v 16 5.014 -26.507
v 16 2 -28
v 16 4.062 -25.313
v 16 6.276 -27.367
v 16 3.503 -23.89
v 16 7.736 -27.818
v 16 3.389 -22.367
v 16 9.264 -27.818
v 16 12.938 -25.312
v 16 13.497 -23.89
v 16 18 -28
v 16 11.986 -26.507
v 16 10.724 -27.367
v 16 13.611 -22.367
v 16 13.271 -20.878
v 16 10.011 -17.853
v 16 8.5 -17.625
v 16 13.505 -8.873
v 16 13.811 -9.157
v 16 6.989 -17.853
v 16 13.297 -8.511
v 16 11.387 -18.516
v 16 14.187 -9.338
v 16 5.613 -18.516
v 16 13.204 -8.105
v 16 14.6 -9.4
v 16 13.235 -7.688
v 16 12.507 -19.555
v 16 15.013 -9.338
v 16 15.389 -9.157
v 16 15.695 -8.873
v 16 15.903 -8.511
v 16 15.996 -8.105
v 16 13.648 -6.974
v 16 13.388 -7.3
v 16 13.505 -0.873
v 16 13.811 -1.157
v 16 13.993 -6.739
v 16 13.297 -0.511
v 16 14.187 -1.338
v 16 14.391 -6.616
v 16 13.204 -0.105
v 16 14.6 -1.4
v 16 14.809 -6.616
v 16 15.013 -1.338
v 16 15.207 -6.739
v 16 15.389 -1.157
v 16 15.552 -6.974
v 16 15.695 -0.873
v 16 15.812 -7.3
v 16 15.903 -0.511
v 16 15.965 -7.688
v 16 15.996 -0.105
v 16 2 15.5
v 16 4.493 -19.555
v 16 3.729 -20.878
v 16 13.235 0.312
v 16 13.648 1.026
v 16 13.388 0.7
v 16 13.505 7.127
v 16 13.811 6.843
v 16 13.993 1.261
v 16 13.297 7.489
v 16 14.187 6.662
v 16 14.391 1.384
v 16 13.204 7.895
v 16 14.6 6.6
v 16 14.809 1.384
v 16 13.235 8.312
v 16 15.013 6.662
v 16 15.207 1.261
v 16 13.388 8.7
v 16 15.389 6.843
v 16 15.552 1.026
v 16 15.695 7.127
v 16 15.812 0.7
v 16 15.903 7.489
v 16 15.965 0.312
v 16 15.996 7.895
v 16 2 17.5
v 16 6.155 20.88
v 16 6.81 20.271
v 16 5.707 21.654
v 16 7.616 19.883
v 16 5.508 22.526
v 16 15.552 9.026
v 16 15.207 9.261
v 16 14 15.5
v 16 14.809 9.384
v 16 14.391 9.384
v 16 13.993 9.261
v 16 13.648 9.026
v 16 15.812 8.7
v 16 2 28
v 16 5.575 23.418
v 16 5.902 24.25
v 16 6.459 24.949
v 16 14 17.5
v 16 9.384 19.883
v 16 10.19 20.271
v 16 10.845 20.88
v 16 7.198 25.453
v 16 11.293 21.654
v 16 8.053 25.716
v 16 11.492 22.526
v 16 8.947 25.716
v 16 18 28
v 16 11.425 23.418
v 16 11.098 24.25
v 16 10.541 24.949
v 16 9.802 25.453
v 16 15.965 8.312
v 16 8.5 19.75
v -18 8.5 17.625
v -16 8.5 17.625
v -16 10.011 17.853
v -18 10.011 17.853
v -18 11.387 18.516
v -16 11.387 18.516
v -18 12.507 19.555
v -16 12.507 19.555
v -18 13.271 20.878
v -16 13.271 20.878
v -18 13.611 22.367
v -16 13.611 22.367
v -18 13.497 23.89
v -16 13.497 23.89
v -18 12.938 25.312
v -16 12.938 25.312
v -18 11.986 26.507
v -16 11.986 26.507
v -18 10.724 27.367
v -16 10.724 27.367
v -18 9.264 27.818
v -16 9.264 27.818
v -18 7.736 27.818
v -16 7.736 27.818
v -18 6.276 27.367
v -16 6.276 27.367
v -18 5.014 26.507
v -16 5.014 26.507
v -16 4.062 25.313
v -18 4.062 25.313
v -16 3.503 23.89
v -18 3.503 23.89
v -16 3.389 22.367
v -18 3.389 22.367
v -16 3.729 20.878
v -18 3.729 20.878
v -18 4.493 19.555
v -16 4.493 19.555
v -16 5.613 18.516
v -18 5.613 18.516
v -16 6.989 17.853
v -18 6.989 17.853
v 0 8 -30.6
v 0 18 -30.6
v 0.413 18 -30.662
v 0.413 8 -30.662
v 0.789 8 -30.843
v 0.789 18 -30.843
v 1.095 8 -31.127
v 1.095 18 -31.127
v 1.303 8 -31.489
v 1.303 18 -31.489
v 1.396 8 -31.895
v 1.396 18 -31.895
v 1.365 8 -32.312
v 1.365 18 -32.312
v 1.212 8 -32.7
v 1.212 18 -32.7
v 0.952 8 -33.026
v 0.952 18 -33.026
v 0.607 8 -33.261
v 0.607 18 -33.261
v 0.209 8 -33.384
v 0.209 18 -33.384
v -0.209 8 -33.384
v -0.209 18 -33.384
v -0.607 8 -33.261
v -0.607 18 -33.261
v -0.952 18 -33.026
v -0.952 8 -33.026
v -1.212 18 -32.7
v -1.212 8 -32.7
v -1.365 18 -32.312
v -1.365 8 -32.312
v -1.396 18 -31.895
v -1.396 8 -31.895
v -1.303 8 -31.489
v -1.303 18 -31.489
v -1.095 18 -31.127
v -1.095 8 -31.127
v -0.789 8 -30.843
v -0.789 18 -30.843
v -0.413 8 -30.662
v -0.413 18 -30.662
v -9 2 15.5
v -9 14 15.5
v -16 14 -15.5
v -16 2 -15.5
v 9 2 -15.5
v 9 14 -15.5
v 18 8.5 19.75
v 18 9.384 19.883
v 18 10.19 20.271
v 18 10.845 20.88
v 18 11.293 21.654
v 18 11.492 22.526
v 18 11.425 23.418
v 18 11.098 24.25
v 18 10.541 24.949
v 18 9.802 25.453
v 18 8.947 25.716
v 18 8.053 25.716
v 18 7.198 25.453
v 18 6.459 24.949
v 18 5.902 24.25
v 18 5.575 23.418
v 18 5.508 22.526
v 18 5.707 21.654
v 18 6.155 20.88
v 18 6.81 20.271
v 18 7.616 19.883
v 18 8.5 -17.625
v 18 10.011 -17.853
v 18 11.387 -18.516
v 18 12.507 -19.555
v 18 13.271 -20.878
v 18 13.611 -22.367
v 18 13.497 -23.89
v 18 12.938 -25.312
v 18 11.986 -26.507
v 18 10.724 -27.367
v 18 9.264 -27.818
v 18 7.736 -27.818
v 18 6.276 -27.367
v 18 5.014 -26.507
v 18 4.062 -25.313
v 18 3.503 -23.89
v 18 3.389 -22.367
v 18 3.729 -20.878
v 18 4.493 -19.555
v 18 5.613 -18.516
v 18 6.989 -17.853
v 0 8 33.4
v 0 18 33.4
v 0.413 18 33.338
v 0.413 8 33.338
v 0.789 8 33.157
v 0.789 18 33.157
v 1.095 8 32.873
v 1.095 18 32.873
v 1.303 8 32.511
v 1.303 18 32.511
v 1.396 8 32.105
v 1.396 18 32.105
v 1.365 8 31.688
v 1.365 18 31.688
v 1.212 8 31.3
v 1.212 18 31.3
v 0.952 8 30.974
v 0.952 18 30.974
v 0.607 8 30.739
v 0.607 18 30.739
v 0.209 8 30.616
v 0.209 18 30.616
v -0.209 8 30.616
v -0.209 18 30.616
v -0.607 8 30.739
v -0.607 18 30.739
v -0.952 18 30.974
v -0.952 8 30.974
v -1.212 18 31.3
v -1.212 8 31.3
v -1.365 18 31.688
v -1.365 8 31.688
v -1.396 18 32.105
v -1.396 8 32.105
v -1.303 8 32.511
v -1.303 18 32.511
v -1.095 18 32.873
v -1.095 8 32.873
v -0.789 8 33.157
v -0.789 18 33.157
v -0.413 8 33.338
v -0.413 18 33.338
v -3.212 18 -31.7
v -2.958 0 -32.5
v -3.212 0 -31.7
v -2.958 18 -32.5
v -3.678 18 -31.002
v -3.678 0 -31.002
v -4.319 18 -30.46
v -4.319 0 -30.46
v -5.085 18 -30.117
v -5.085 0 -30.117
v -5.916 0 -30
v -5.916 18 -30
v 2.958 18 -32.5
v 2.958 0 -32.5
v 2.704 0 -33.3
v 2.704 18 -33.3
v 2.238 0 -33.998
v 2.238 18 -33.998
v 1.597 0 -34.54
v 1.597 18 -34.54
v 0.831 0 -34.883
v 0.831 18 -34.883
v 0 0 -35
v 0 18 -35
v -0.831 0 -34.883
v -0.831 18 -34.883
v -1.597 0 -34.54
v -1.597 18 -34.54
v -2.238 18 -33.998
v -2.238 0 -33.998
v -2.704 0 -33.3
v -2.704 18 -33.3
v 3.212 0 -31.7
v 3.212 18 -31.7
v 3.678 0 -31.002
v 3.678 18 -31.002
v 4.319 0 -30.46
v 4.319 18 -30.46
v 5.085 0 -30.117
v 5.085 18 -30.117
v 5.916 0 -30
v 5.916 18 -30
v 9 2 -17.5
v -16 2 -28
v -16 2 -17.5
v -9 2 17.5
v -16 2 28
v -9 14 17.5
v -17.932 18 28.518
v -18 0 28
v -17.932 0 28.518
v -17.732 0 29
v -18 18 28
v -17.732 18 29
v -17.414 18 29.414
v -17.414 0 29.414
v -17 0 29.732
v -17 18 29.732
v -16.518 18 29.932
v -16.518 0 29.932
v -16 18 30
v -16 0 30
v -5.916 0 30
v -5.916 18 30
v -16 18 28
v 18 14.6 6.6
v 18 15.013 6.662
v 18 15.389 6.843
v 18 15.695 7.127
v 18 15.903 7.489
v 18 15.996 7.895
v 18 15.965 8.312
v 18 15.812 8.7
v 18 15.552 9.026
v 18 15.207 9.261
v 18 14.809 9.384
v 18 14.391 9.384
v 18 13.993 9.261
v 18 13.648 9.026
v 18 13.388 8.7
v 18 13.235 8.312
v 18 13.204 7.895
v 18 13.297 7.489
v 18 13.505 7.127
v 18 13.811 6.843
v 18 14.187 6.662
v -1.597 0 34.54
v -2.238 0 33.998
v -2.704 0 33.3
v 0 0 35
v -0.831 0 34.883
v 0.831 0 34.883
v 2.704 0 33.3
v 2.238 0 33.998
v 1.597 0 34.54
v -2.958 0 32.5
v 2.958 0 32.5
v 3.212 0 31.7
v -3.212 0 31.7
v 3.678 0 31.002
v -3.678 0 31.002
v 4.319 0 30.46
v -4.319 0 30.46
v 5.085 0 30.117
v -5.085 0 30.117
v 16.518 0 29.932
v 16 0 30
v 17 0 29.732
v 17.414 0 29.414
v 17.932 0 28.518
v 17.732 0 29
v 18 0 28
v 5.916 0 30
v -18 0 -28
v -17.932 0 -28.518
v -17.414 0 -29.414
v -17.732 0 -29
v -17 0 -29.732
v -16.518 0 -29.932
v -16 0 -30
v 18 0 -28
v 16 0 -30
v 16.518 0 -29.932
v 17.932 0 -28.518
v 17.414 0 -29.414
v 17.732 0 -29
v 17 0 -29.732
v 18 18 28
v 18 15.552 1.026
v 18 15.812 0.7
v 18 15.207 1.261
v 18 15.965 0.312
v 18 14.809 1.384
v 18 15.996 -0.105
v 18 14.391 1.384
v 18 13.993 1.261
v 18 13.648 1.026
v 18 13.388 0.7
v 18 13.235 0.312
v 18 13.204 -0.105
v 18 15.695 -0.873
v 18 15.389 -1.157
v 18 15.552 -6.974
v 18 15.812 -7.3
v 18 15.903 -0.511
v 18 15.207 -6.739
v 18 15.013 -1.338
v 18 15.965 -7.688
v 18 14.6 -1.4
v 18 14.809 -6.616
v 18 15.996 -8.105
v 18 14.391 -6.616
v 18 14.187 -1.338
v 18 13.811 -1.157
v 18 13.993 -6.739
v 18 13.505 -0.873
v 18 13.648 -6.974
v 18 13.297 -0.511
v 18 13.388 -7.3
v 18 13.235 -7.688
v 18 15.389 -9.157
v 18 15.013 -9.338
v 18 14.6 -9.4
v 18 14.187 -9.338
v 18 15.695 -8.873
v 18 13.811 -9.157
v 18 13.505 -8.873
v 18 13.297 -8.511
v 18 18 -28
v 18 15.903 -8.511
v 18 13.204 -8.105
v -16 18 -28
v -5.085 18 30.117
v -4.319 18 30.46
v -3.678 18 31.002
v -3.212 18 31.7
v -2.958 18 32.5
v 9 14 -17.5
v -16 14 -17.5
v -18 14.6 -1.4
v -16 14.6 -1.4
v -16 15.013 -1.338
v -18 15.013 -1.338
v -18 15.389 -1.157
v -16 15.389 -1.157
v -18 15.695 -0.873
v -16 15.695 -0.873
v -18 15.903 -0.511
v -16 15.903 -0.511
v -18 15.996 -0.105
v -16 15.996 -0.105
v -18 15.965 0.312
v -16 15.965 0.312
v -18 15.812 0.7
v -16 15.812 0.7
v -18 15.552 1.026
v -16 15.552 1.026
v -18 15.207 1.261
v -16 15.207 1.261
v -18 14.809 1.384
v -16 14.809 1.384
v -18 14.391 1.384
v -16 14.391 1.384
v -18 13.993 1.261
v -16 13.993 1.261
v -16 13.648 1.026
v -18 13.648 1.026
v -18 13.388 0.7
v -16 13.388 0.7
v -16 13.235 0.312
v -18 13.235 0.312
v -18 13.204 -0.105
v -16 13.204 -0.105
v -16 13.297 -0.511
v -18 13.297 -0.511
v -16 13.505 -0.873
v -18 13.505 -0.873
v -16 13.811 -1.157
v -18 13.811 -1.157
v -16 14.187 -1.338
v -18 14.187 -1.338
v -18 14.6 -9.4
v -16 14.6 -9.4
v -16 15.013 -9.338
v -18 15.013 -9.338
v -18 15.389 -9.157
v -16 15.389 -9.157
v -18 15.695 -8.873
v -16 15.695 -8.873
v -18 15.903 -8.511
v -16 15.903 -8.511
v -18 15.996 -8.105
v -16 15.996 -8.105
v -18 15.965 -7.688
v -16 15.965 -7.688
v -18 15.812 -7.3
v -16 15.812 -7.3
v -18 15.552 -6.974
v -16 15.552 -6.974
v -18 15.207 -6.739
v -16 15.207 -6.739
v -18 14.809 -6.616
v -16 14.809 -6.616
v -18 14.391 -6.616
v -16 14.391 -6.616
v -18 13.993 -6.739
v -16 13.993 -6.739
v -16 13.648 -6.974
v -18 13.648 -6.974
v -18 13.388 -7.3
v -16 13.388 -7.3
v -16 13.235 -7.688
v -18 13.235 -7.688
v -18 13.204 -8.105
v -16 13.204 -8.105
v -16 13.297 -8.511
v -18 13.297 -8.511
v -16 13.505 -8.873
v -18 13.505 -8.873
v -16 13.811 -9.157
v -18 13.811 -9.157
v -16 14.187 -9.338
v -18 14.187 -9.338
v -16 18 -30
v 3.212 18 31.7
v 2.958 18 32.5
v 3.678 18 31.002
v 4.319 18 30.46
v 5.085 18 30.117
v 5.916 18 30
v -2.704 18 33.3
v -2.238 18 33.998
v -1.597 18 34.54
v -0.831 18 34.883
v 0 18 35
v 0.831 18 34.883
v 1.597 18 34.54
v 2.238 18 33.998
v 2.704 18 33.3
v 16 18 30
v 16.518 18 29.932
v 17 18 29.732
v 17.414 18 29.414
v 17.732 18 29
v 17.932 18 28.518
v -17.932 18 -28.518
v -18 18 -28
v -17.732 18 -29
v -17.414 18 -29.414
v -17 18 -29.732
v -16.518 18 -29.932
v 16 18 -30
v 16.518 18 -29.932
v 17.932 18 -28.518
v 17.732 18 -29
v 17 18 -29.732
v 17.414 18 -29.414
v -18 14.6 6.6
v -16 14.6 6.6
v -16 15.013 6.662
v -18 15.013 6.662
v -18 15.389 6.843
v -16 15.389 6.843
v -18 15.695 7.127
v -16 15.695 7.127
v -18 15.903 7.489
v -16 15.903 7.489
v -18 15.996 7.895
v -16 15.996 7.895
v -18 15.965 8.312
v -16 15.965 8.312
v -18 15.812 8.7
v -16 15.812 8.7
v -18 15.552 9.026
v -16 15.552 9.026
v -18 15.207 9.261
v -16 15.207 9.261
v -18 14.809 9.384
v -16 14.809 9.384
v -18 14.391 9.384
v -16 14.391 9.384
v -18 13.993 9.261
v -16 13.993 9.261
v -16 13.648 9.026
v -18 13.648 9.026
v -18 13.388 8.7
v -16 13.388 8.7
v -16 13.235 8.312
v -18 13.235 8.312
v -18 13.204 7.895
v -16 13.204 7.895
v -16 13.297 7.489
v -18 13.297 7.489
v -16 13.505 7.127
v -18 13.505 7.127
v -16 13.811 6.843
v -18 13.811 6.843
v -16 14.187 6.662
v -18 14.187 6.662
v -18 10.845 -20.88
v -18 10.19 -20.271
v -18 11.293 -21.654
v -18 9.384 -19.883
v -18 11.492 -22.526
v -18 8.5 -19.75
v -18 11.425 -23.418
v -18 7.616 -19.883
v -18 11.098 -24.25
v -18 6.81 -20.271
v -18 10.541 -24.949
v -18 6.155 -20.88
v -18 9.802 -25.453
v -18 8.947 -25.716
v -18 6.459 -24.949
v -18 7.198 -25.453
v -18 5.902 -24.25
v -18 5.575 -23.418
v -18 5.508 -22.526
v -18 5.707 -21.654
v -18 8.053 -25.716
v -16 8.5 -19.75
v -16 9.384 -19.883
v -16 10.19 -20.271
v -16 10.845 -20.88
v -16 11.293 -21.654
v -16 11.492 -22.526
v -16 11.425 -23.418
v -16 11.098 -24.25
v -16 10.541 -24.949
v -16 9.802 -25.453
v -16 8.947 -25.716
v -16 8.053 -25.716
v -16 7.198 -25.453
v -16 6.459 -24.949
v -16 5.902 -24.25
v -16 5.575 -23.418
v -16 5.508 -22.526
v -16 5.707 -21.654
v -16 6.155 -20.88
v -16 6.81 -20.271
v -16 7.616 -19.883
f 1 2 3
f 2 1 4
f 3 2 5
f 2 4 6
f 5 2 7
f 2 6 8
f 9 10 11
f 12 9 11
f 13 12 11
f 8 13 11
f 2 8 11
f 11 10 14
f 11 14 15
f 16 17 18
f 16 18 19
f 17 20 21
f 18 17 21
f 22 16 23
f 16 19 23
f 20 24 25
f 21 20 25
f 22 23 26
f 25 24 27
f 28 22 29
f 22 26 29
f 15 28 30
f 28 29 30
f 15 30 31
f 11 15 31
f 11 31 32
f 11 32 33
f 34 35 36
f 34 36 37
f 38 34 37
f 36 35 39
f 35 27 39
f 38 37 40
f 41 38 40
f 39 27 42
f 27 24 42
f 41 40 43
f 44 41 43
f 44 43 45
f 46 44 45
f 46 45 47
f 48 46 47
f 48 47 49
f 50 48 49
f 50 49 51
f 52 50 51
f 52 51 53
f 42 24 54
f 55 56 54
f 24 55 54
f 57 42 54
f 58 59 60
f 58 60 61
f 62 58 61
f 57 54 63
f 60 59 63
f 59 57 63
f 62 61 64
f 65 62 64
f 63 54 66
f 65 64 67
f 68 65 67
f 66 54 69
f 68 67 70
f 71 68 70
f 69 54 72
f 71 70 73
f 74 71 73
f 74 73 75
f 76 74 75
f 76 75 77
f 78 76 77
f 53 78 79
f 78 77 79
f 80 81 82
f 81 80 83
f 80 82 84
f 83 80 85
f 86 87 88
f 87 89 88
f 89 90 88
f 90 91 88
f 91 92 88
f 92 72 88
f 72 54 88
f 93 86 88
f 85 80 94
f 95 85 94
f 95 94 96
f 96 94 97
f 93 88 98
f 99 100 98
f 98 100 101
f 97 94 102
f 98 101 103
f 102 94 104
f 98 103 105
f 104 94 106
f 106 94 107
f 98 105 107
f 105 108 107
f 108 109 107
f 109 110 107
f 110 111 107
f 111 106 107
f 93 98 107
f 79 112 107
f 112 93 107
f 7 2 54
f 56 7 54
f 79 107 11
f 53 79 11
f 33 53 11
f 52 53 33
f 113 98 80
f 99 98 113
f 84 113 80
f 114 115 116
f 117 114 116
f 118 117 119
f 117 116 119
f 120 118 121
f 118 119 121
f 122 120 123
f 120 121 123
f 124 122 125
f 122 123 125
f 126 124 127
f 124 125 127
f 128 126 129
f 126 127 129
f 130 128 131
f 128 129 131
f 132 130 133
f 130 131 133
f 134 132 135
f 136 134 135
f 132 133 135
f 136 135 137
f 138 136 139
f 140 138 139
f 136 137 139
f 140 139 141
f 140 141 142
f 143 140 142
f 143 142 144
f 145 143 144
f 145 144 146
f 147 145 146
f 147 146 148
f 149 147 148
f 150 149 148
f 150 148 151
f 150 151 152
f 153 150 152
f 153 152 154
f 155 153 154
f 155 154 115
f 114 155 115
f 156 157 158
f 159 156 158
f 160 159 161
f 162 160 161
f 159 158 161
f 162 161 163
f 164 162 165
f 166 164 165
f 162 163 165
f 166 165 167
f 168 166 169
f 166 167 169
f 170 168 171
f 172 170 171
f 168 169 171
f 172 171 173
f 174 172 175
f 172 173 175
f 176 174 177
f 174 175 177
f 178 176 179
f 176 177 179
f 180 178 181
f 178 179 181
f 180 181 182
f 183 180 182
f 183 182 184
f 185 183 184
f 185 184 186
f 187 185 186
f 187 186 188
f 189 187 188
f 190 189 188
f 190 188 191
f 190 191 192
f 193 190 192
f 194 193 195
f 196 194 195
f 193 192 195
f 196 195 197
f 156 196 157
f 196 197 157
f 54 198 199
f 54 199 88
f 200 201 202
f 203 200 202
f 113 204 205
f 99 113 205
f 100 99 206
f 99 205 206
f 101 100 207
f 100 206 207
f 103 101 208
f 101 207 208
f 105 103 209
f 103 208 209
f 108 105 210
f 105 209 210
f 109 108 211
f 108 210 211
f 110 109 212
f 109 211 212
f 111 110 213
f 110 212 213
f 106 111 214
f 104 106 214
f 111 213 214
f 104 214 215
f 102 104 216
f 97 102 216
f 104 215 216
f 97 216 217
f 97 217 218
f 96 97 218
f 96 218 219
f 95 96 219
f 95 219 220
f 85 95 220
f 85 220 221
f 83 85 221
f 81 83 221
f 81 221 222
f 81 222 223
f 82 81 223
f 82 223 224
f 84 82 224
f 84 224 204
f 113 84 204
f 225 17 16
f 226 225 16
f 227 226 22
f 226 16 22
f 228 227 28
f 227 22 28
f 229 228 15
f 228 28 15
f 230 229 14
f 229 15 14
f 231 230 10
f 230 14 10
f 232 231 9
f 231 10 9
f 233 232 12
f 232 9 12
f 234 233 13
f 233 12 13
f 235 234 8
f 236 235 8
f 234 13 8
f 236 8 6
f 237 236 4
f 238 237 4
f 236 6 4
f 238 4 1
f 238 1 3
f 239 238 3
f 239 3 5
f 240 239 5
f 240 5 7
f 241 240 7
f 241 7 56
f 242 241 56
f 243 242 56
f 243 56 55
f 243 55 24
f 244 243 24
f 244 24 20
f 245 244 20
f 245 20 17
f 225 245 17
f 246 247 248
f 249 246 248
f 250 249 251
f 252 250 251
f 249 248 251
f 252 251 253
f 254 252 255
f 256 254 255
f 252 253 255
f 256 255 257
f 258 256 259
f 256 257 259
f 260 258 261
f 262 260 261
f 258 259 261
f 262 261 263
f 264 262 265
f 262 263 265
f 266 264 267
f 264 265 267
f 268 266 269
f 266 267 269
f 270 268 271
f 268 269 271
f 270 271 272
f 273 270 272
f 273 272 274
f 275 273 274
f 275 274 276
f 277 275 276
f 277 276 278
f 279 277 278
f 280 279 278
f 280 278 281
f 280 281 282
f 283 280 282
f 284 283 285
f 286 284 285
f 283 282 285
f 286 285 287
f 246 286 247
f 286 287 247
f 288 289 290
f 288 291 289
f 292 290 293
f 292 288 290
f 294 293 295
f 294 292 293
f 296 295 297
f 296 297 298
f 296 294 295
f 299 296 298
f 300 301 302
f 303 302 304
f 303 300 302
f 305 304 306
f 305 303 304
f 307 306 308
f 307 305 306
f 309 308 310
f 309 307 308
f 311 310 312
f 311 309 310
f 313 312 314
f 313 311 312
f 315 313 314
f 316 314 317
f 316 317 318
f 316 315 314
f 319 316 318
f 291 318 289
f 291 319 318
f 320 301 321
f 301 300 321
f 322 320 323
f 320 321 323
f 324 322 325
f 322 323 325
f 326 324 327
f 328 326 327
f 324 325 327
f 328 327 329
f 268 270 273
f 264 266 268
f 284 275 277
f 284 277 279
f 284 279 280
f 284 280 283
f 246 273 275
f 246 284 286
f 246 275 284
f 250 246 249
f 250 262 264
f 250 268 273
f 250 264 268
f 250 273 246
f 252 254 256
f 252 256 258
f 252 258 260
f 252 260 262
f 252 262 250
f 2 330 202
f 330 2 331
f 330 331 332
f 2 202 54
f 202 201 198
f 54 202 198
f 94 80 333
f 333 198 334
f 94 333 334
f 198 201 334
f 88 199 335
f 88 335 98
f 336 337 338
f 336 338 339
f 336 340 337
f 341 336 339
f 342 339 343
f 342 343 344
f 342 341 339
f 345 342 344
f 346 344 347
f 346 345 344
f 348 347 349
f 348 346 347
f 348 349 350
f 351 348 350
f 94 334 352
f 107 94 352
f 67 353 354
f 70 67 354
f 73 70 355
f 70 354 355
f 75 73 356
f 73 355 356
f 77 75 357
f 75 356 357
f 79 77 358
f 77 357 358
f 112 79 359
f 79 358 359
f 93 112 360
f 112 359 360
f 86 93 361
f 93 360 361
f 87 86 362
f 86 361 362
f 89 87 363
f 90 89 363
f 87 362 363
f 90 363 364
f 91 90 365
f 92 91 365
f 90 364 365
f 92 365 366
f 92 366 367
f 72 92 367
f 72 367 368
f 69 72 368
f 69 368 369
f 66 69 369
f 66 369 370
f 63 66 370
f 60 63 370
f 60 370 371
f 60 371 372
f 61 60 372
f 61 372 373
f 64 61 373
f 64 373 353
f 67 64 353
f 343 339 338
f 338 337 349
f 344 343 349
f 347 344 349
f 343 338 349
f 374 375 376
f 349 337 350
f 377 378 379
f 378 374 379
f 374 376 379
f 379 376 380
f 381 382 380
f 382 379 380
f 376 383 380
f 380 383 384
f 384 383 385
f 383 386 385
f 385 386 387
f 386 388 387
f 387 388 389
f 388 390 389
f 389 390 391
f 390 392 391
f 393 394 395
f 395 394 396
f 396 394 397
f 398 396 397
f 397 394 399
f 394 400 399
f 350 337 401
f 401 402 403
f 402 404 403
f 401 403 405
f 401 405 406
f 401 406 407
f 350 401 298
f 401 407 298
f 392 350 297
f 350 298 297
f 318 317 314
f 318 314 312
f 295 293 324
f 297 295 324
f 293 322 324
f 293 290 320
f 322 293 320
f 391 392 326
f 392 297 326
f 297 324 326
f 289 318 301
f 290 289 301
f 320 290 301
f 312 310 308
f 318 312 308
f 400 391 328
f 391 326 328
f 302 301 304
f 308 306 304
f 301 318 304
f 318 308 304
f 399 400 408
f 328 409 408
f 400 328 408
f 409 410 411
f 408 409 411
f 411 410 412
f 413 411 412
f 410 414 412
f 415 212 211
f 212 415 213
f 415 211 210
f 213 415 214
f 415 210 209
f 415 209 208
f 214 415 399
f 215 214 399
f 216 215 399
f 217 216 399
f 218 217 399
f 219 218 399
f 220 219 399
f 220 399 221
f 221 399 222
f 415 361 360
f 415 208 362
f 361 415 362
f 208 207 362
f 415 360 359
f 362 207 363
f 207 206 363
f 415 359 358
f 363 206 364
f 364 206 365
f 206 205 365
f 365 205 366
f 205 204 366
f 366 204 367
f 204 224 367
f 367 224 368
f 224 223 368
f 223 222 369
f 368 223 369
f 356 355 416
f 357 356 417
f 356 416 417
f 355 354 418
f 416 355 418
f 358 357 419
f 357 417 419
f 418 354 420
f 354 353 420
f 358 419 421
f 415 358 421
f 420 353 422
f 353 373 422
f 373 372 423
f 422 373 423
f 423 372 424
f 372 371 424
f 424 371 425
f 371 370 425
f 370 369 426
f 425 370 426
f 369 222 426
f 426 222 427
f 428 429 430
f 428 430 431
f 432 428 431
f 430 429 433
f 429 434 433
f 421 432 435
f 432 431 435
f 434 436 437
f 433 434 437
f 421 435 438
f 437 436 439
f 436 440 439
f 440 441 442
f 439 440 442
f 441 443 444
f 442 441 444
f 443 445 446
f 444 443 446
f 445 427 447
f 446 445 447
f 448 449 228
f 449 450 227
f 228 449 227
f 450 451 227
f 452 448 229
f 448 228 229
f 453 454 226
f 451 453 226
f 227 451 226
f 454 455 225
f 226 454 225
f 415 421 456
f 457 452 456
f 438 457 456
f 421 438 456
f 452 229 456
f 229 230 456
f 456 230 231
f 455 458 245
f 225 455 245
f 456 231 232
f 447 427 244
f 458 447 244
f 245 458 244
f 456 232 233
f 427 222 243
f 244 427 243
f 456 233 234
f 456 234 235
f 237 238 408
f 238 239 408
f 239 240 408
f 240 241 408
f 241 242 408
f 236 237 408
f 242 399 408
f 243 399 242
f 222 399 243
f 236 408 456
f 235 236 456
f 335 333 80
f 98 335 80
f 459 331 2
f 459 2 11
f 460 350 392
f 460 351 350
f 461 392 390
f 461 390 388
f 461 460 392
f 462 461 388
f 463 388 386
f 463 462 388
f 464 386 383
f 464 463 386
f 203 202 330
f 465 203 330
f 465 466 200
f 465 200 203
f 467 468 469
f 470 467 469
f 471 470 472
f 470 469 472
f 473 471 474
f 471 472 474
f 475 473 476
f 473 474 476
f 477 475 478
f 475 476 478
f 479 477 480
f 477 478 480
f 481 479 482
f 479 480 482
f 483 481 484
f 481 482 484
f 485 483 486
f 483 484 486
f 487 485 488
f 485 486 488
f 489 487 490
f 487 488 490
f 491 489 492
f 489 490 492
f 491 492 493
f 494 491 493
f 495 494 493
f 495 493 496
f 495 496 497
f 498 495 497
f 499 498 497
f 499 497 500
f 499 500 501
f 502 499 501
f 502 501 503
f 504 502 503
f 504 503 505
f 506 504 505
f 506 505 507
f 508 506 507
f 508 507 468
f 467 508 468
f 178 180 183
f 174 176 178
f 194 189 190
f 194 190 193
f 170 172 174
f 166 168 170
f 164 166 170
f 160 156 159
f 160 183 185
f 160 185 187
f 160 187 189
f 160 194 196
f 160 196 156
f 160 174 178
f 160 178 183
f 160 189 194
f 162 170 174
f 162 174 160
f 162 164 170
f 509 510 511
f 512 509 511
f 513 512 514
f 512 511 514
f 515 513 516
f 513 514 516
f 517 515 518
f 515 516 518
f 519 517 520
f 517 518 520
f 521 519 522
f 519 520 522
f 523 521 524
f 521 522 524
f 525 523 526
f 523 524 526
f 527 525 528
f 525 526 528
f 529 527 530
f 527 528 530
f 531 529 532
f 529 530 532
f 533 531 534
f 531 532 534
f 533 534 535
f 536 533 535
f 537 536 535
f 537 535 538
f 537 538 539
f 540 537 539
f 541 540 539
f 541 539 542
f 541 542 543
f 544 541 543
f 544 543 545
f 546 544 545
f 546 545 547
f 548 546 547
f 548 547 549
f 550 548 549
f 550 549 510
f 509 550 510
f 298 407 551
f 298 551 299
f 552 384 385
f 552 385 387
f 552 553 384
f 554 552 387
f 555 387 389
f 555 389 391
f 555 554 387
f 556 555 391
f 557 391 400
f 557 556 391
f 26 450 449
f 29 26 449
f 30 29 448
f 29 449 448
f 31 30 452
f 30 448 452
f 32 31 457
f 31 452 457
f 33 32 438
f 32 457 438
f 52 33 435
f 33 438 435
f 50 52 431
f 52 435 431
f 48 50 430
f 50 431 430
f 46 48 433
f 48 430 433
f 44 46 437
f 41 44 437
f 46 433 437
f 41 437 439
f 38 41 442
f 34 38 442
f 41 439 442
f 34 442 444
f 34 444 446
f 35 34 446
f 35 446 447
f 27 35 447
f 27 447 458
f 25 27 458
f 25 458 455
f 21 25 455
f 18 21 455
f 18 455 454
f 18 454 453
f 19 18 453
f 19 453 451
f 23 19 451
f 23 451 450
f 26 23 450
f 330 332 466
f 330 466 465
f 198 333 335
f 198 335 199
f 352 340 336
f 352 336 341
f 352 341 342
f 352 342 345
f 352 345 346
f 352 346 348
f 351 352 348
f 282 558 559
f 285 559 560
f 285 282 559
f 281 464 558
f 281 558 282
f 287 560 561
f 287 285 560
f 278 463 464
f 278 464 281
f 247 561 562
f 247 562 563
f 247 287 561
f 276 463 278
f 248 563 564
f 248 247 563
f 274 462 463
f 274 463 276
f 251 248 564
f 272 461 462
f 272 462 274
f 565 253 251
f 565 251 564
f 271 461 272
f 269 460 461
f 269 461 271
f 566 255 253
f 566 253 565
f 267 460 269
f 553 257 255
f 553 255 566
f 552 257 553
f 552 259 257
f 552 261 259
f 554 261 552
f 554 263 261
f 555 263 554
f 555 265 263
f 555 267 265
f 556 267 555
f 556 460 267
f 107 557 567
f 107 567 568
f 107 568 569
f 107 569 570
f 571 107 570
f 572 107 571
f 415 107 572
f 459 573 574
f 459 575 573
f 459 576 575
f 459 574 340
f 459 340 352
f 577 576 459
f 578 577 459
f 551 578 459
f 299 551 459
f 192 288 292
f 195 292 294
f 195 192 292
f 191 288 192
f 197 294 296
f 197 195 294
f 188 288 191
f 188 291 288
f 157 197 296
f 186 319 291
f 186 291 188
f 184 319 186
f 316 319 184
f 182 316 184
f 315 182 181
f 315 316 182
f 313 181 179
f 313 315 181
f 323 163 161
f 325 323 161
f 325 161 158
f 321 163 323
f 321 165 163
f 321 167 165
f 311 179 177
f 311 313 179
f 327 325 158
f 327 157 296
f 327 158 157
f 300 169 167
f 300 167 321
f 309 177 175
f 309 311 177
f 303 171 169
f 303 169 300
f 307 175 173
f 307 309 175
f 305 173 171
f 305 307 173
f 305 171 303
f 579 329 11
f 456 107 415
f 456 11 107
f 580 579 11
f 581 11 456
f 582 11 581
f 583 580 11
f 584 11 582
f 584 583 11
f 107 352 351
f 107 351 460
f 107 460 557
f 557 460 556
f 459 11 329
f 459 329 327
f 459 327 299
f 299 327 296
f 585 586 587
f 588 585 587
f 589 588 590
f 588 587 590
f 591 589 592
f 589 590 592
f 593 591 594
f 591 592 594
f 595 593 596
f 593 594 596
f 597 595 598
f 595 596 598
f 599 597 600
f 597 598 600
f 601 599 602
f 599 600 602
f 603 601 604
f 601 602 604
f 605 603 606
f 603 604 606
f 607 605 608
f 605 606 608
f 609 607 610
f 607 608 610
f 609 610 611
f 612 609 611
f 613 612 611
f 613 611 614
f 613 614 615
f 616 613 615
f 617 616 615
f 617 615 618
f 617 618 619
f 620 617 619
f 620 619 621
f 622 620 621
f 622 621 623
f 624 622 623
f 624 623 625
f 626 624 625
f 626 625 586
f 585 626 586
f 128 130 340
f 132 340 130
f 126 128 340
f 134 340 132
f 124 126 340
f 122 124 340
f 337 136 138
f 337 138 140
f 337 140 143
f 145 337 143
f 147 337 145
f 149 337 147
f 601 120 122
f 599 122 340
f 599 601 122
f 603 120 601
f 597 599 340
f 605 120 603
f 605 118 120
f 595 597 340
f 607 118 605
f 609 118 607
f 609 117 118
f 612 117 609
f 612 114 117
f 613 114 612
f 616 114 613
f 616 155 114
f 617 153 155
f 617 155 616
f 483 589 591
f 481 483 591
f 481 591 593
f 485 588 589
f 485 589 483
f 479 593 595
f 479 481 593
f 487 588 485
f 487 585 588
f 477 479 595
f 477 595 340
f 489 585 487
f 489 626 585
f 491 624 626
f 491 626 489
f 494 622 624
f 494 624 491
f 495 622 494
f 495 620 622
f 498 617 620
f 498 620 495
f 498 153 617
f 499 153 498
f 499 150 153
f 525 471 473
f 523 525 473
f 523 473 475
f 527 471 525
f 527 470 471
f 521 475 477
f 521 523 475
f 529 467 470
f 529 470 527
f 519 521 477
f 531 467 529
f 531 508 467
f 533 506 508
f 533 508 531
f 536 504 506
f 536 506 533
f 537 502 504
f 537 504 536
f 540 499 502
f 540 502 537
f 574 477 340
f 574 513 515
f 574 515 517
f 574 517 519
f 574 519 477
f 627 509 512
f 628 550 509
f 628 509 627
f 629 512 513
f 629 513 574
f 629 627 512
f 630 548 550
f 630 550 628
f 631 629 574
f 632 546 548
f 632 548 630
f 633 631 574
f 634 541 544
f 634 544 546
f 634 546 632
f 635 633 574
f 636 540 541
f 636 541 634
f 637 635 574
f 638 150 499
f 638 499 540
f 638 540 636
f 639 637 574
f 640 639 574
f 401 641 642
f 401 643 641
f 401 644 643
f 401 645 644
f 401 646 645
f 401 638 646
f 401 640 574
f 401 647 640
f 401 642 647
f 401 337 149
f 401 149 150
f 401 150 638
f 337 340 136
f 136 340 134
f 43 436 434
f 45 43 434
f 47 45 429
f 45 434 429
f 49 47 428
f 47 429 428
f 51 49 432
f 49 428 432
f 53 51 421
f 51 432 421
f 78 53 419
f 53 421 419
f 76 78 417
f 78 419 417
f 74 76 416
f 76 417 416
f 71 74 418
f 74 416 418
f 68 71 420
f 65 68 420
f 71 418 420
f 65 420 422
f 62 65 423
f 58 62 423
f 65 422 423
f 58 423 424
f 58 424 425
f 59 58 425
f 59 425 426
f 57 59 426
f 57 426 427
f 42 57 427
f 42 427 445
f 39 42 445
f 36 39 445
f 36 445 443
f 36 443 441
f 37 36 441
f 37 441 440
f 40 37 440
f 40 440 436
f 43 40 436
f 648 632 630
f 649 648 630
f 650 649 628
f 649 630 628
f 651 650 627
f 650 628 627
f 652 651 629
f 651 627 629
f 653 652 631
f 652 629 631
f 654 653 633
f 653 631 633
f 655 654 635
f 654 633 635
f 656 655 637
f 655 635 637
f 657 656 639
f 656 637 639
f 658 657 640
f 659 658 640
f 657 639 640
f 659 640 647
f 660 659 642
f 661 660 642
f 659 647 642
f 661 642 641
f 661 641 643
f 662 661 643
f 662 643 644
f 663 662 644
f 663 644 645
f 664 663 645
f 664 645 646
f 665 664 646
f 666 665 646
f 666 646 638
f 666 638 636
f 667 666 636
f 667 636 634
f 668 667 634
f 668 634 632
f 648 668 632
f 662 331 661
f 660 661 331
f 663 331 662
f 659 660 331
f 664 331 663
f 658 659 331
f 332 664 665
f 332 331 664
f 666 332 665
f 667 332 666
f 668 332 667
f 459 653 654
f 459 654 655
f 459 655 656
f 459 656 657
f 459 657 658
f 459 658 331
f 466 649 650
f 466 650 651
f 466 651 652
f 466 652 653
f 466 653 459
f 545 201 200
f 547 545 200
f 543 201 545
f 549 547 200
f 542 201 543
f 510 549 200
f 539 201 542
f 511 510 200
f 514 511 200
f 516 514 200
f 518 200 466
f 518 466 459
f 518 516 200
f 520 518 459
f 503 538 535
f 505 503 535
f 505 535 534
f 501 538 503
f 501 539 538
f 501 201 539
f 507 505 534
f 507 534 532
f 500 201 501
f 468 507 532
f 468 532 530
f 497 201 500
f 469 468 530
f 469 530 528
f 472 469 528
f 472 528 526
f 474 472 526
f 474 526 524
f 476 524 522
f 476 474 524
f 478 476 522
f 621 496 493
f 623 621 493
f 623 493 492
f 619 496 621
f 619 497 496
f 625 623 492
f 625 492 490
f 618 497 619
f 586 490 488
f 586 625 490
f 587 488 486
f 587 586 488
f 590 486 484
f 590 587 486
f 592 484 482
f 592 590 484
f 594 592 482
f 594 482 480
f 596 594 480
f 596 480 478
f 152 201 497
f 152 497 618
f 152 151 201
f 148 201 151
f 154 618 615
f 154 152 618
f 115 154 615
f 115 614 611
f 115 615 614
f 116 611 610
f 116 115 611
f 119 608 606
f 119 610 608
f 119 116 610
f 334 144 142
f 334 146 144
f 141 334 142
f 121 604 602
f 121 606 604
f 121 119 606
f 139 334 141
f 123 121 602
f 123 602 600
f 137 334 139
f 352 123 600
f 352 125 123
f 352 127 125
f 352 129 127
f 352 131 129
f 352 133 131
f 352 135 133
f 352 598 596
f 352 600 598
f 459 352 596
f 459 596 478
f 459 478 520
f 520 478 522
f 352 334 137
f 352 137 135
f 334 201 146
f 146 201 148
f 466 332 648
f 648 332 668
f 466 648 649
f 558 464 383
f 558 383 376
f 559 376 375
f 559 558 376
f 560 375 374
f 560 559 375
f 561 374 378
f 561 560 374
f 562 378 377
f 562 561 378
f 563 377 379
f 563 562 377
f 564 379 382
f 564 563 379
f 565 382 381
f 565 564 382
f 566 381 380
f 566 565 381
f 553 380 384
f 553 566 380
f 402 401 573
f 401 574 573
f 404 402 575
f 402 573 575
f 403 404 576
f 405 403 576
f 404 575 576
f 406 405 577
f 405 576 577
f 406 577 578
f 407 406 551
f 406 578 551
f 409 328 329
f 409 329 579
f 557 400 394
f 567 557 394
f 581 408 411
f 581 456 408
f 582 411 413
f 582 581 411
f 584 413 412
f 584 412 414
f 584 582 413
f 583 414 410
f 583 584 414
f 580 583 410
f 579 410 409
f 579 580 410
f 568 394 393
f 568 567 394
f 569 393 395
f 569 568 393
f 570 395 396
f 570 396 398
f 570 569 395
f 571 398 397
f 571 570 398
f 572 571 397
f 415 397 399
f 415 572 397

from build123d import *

# Parameters (mm, degrees)
SKETCH_1_W          = 36
SKETCH_1_H          = 60
EXTRUDE_1_DEPTH     = 18
FILLET_1_R          = 2
SHELL_START         = -16
SHELL_1_OUTLINE_W   = 16
SHELL_1_OUTLINE_H   = 56
SHELL_1_DEPTH       = 32
SKETCH_2_W          = 25
SKETCH_2_H          = 2
EXTRUDE_2_DEPTH     = 12
SKETCH_3_R          = 3
CUT_EXTRUDE_1_DEPTH = 14
SKETCH_4_R          = 3
EXTRUDE_3_DEPTH     = 18
FILLET_2_R          = 3
SKETCH_6_W          = 25
SKETCH_6_H          = 2
EXTRUDE_4_DEPTH     = 12
SKETCH_8_R          = 3
CUT_EXTRUDE_2_DEPTH = 14
SKETCH_9_R          = 1.4
CUT_EXTRUDE_3_DEPTH = 10
SKETCH_11_R         = 1.4
CUT_EXTRUDE_5_DEPTH = 66
SKETCH_13_R         = 5.125
CUT_EXTRUDE_6_DEPTH = 66
SKETCH_14_R         = 5.125
CUT_EXTRUDE_7_DEPTH = 66


# Read off the part's stored shape, not the designer's step: 抽壳1
with BuildPart() as part:
    # 草图1 → 凸台-拉伸1 (new body)
    with BuildSketch(Plane(origin=(0, 0, 0), x_dir=(1, 0, 0), z_dir=(0, 1, 0))):
        Rectangle(SKETCH_1_W, SKETCH_1_H)
    extrude(amount=EXTRUDE_1_DEPTH)

    # 圆角1
    fillet_1_edges = [part.edges().sort_by_distance(p)[0] for p in [
        (-18, 9, -30),
        (18, 9, -30),
        (18, 9, 30),
        (-18, 9, 30),
    ]]
    fillet(fillet_1_edges, radius=FILLET_1_R)

    # 抽壳1 outline → 抽壳1 (cut)
    with BuildSketch(Plane.YZ.offset(SHELL_START)):
        with Locations((10, 0)):
            Rectangle(SHELL_1_OUTLINE_W, SHELL_1_OUTLINE_H)
    extrude(amount=SHELL_1_DEPTH, mode=Mode.SUBTRACT)

    # 草图2 → 凸台-拉伸2 (add)
    with BuildSketch(Plane(origin=(0, 2, 0), x_dir=(1, 0, 0), z_dir=(0, 1, 0))):
        with Locations((3.5, -16.5)):
            Rectangle(SKETCH_2_W, SKETCH_2_H)
    extrude(amount=EXTRUDE_2_DEPTH)

    # 草图3 → 切除-拉伸1 (cut)
    with BuildSketch(Plane(origin=(18, 0, 0), x_dir=(0, 0, -1), z_dir=(1, 0, 0))):
        with Locations((-22.75, 8.5)):
            Circle(SKETCH_3_R)
    extrude(amount=-CUT_EXTRUDE_1_DEPTH, mode=Mode.SUBTRACT)

    # 草图4 → 凸台-拉伸3 (add)
    with BuildSketch(Plane(origin=(0, 18, 0), x_dir=(1, 0, 0), z_dir=(0, 1, 0))):
        with Locations((0, 32)):
            Circle(SKETCH_4_R)
        with Locations((0, -32)):
            Circle(SKETCH_4_R)
    extrude(amount=-EXTRUDE_3_DEPTH)

    # 圆角2
    fillet_2_edges = [part.edges().sort_by_distance(p)[0] for p in [
        (2.236067977, 9, -30),
        (-2.236067977, 9, -30),
        (-2.236067977, 9, 30),
        (2.236067977, 9, 30),
    ]]
    fillet(fillet_2_edges, radius=FILLET_2_R)

    # 草图6 → 凸台-拉伸4 (add)
    with BuildSketch(Plane(origin=(0, 2, 0), x_dir=(1, 0, 0), z_dir=(0, 1, 0))):
        with Locations((-3.5, 16.5)):
            Rectangle(SKETCH_6_W, SKETCH_6_H)
    extrude(amount=EXTRUDE_4_DEPTH)

    # 草图8 → 切除-拉伸2 (cut)
    with BuildSketch(Plane.ZY.offset(18)):
        with Locations((-22.75, 8.5)):
            Circle(SKETCH_8_R)
    extrude(amount=-CUT_EXTRUDE_2_DEPTH, mode=Mode.SUBTRACT)

    # 草图9 → 切除-拉伸3 (cut)
    with BuildSketch(Plane(origin=(0, 18, 0), x_dir=(1, 0, 0), z_dir=(0, 1, 0))):
        with Locations(Location((0, 32, 0), (0, 0, 270))):
            Circle(SKETCH_9_R)
        with Locations(Location((0, -32, 0), (0, 0, 270))):
            Circle(SKETCH_9_R)
    extrude(amount=-CUT_EXTRUDE_3_DEPTH, mode=Mode.SUBTRACT)

    # 草图11 → 切除-拉伸5 (cut)
    with BuildSketch(Plane(origin=(18, 0, 0), x_dir=(0, 0, -1), z_dir=(1, 0, 0))):
        with Locations((-8, 14.6)):
            Circle(SKETCH_11_R)
        with Locations((0, 14.6)):
            Circle(SKETCH_11_R)
        with Locations((8, 14.6)):
            Circle(SKETCH_11_R)
    extrude(amount=-CUT_EXTRUDE_5_DEPTH, mode=Mode.SUBTRACT)

    # 草图13 → 切除-拉伸6 (cut)
    with BuildSketch(Plane.ZY.offset(-16)):
        with Locations((-22.75, 8.5)):
            Circle(SKETCH_13_R)
    extrude(amount=-CUT_EXTRUDE_6_DEPTH, mode=Mode.SUBTRACT)

    # 草图14 → 切除-拉伸7 (cut)
    with BuildSketch(Plane(origin=(-16, 0, 0), x_dir=(0, 0, -1), z_dir=(1, 0, 0))):
        with Locations((-22.75, 8.5)):
            Circle(SKETCH_14_R)
    extrude(amount=-CUT_EXTRUDE_7_DEPTH, mode=Mode.SUBTRACT)


solid = part.part
